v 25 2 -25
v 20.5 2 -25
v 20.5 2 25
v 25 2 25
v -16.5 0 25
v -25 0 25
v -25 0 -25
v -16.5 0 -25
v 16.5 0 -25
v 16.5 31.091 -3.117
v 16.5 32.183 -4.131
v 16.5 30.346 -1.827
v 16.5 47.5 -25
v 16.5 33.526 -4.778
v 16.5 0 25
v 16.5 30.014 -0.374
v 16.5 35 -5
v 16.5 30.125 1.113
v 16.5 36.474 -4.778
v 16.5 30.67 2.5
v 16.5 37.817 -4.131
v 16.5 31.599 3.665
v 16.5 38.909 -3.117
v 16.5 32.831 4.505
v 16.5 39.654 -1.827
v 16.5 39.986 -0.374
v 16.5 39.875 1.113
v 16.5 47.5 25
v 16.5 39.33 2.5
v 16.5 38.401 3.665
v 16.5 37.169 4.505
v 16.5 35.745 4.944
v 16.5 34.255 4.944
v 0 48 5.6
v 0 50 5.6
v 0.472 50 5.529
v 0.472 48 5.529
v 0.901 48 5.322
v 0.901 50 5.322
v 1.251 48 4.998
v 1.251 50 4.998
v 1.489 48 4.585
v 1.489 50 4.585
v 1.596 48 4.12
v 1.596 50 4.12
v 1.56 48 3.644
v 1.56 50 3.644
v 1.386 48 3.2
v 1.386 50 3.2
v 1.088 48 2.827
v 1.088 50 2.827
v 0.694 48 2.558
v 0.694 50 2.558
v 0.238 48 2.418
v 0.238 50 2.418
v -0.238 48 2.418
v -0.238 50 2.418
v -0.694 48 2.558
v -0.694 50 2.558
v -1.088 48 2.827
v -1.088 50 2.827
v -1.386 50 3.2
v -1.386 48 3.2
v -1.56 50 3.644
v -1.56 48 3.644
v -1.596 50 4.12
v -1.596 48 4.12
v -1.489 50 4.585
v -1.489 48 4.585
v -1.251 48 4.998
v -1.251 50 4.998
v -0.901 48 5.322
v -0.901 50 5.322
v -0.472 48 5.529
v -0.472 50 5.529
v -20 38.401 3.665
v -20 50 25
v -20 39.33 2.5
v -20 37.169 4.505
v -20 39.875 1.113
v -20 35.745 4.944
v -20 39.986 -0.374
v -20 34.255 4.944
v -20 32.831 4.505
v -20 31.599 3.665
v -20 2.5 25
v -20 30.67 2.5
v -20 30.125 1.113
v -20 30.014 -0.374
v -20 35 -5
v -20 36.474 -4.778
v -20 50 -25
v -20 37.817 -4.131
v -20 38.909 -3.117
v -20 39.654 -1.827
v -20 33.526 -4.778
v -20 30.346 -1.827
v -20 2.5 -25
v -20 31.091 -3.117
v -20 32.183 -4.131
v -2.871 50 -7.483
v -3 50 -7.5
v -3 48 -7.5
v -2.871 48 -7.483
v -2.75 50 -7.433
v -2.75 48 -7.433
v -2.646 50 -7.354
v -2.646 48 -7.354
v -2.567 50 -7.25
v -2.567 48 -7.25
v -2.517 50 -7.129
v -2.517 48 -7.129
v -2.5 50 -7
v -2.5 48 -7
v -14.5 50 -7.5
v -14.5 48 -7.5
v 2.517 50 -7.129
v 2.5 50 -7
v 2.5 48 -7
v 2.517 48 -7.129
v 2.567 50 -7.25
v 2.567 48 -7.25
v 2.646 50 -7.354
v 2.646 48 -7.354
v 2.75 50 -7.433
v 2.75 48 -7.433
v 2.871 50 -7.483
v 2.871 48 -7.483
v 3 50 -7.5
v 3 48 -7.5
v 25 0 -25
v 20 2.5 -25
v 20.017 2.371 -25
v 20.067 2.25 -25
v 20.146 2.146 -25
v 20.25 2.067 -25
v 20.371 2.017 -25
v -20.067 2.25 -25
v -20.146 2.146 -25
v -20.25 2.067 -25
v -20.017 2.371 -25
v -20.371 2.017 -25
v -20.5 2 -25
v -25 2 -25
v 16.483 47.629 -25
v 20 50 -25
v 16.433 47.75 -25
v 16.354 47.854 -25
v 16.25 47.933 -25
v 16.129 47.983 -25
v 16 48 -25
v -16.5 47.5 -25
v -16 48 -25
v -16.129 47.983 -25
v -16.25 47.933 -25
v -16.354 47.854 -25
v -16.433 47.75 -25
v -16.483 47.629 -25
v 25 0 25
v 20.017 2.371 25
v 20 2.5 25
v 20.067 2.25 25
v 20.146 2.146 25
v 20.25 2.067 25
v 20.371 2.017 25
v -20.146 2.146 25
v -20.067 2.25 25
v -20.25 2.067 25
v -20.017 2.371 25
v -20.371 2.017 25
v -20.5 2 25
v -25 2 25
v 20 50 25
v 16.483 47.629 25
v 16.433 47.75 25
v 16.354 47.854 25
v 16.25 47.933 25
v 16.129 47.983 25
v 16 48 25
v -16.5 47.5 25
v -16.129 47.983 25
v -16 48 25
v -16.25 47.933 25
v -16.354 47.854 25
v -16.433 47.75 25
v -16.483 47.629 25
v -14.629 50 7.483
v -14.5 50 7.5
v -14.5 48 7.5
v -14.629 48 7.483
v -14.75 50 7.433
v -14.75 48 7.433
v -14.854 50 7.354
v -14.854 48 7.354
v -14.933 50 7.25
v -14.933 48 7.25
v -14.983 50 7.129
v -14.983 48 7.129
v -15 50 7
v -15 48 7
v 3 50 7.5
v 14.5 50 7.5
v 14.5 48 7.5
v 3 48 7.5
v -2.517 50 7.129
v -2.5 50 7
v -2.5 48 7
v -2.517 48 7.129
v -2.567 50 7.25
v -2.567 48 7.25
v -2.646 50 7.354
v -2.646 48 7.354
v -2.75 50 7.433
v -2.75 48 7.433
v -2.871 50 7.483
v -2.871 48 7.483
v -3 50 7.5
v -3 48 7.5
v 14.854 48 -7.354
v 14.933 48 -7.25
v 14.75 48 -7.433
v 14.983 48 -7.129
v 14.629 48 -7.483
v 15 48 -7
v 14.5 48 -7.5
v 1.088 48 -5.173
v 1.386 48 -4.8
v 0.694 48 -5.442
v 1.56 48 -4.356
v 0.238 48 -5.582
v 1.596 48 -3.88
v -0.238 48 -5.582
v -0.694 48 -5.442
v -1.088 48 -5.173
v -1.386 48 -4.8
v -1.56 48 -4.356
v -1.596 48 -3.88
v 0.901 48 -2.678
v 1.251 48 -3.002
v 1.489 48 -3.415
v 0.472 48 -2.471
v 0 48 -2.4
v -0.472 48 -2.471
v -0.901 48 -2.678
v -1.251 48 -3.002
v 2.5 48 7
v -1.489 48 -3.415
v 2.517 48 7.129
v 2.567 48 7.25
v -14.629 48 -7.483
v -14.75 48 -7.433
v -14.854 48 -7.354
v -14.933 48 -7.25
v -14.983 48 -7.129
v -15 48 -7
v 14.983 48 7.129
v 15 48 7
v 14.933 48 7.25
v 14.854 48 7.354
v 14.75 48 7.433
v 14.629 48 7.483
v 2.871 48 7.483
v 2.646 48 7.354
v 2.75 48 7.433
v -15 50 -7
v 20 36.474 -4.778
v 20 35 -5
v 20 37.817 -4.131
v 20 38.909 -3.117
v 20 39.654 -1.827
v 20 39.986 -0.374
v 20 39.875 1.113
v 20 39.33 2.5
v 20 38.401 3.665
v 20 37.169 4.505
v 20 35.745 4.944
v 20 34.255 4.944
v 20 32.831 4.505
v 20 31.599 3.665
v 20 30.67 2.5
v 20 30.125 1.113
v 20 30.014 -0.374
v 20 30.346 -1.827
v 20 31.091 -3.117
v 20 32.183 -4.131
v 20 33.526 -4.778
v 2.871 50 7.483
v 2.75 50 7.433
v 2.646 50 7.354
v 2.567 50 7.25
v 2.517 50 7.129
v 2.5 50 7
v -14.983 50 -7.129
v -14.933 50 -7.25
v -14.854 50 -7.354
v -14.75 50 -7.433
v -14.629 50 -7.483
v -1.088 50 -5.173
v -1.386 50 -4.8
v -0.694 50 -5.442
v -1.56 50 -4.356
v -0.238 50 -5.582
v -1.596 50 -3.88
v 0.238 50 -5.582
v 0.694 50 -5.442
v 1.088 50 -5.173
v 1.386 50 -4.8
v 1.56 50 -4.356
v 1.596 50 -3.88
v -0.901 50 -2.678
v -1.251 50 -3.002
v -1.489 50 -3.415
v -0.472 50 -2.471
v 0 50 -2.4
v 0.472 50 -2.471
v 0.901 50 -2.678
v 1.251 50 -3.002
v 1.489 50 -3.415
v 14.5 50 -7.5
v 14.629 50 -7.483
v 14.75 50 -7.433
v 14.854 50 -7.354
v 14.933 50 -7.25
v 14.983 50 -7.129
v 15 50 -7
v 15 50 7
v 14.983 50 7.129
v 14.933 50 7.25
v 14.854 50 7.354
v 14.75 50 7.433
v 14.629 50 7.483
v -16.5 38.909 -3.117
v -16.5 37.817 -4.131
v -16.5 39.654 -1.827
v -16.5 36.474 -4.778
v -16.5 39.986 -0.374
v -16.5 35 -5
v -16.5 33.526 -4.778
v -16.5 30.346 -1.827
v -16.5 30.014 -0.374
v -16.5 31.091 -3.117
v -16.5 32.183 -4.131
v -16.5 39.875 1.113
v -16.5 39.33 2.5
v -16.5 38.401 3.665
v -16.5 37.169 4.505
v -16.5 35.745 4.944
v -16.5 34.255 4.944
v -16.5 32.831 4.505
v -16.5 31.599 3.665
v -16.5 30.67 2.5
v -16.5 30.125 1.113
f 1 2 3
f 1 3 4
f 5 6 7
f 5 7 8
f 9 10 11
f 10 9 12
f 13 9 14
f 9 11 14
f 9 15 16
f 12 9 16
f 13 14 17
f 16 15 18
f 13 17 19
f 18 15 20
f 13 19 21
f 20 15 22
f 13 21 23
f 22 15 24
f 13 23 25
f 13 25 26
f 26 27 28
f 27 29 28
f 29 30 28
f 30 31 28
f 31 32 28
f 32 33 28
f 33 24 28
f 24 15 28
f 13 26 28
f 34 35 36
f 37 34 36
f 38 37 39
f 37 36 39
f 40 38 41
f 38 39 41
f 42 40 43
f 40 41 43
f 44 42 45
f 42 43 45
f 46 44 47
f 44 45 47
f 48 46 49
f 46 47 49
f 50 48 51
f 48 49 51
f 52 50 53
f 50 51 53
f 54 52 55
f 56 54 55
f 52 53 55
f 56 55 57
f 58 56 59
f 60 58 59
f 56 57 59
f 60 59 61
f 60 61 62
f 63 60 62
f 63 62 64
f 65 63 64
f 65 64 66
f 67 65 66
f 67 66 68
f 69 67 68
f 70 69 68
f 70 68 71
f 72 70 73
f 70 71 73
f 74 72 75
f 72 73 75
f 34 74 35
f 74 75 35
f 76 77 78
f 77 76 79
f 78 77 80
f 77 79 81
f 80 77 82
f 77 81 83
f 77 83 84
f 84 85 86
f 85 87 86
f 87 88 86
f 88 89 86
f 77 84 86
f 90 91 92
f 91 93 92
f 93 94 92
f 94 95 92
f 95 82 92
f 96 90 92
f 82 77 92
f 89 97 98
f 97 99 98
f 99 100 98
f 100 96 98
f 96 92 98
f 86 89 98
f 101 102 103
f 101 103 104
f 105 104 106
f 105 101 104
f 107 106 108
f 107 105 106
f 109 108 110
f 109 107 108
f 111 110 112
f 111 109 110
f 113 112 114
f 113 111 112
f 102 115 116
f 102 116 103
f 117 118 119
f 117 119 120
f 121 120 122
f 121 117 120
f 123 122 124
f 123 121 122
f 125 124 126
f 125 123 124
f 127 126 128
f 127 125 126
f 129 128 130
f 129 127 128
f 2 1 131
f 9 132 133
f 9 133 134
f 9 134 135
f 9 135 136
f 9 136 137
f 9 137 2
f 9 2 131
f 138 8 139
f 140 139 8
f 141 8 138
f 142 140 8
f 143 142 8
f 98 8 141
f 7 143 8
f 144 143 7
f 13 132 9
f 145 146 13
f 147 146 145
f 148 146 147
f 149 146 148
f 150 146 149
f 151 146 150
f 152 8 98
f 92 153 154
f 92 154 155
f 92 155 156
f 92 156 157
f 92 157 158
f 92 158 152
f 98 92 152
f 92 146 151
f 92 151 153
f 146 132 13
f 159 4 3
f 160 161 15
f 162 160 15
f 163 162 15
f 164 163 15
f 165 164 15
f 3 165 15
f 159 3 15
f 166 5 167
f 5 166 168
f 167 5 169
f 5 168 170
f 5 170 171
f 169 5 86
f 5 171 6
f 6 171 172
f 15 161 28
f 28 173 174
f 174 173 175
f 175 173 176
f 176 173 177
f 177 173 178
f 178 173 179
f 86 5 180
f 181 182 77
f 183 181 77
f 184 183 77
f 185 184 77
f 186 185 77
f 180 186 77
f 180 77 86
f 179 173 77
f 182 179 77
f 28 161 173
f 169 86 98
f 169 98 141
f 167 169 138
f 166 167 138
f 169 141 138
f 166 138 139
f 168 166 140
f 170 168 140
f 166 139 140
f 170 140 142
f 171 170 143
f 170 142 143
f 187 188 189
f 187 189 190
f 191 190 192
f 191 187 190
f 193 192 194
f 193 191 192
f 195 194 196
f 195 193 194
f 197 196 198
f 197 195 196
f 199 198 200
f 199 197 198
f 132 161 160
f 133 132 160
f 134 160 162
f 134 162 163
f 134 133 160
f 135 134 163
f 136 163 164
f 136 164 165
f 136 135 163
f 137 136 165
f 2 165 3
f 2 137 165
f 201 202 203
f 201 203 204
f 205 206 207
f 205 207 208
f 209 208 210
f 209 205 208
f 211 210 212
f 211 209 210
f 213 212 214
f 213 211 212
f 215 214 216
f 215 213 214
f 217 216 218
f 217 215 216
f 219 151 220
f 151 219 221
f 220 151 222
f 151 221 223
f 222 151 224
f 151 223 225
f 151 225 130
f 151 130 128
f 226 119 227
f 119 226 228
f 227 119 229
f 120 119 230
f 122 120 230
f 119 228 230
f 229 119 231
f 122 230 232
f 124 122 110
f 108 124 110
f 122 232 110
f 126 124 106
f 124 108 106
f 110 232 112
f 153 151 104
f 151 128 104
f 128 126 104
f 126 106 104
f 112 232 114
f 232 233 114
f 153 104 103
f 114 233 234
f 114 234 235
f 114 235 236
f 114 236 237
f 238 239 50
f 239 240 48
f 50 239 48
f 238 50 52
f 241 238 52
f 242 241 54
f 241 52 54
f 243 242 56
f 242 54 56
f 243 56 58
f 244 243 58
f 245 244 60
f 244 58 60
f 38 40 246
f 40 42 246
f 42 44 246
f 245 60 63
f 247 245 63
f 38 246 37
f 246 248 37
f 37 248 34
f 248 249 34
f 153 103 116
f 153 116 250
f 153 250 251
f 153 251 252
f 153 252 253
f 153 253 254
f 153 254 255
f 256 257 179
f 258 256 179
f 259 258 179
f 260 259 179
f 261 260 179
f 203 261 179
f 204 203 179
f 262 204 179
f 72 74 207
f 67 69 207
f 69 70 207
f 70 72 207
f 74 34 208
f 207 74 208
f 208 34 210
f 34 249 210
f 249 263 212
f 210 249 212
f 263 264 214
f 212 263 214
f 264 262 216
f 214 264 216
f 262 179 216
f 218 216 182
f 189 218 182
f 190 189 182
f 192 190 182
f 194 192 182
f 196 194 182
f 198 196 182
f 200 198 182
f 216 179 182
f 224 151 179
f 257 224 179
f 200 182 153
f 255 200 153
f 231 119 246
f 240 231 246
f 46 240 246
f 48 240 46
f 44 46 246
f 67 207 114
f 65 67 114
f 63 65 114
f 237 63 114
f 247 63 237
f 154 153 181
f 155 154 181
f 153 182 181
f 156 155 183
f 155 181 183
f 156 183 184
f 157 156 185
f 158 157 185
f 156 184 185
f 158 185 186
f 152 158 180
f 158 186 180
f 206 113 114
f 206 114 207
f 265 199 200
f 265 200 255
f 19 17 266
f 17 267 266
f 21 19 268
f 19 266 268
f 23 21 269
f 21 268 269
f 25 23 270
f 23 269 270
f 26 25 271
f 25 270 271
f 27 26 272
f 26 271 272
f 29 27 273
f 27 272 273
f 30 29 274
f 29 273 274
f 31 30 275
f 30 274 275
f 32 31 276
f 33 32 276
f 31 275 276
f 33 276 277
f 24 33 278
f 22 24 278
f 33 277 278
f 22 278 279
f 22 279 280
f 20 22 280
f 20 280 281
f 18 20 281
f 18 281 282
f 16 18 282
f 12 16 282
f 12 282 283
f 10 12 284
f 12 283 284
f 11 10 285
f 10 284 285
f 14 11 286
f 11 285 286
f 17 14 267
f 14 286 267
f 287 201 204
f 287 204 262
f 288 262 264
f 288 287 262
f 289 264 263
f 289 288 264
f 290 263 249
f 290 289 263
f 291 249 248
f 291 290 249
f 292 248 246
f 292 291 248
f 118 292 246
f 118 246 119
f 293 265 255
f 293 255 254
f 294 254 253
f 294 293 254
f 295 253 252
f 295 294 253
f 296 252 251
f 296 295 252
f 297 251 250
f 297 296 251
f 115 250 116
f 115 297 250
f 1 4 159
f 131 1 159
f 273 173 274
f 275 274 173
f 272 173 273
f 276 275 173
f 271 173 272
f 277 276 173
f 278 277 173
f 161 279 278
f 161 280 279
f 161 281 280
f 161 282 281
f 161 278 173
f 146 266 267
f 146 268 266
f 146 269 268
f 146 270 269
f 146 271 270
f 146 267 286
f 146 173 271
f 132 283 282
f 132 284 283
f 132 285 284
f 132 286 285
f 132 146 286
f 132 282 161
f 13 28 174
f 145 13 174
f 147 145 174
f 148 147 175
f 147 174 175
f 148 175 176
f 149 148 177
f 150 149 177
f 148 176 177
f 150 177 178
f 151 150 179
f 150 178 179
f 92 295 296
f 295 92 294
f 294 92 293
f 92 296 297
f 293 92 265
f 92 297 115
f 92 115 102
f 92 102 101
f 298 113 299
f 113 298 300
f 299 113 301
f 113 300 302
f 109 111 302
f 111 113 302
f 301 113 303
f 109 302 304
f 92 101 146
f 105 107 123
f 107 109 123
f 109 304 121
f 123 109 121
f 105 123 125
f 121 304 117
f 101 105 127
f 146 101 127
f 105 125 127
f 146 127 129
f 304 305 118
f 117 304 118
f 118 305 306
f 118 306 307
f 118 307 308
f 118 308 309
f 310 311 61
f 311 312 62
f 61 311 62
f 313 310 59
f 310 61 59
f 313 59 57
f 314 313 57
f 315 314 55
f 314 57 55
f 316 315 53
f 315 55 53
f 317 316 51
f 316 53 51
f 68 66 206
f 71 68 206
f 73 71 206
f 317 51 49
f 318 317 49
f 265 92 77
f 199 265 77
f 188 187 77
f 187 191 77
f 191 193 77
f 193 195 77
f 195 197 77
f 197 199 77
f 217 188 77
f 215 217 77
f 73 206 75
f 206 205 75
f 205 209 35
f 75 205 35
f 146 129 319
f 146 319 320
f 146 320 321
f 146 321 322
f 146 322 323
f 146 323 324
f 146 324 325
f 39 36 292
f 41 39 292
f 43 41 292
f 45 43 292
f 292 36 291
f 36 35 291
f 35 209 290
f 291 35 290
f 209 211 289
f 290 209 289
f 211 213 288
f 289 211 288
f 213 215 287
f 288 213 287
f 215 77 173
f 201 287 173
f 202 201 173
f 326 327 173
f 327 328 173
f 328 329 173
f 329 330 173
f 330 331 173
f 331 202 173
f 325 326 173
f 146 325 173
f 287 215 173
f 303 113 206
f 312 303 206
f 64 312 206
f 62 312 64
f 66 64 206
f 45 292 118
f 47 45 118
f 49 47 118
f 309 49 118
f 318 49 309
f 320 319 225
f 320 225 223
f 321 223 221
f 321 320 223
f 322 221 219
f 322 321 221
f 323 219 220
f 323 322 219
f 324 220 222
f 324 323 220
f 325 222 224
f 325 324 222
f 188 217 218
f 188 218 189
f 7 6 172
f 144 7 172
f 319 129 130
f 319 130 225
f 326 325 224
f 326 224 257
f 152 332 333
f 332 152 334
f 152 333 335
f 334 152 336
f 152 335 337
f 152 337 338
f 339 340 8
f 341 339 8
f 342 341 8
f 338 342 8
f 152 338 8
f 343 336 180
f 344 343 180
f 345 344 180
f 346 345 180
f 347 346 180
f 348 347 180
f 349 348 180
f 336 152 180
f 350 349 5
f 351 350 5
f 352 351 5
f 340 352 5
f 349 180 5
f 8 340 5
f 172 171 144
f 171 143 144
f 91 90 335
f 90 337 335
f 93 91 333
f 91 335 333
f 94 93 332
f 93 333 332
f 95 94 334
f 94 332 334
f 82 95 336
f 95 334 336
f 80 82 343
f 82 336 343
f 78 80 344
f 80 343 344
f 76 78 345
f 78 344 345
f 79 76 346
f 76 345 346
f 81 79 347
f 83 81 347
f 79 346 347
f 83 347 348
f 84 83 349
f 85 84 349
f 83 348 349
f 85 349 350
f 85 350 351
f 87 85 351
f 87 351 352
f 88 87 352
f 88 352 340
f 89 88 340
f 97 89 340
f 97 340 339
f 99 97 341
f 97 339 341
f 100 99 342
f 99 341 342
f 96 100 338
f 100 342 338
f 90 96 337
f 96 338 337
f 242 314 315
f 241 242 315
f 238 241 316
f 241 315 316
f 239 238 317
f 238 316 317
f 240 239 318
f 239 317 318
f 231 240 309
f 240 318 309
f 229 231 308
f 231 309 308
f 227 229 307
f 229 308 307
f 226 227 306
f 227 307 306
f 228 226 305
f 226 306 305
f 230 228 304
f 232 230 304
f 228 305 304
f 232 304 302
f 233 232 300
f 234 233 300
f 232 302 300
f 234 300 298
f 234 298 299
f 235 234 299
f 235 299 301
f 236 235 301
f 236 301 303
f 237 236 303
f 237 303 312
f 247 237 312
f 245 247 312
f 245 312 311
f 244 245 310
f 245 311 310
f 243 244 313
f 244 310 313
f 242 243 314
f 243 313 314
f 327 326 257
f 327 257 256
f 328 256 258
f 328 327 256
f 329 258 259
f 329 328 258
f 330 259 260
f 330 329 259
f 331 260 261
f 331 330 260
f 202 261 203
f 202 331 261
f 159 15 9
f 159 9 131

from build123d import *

# Parameters (mm, degrees)
EXTRUDE_1_DEPTH     = 25
CUT_EXTRUDE_1_DEPTH = 25
SKETCH_3_R          = 1.6
CUT_EXTRUDE_2_DEPTH = 2
SKETCH_4_R          = 5
CUT_EXTRUDE_3_DEPTH = 25


with BuildPart() as part:
    # 草图1 → 凸台-拉伸1 (new, symmetric)
    with BuildSketch(Plane.XY):
        Polygon((0, 0), (-25, 0), (-25, 50), (25, 50), (25, 0), align=None)
    extrude(amount=EXTRUDE_1_DEPTH, both=True)

    # 草图2 → 切除-拉伸1 (cut, symmetric)
    with BuildSketch(Plane.XY):
        with BuildLine():
            Line((-25, 50), (-20, 50))
            Line((-20, 50), (-20, 2.5))
            ThreePointArc((-20, 2.5), (-20.146446609, 2.146446609), (-20.5, 2))
            Line((-20.5, 2), (-25, 2))
            Line((-25, 2), (-25, 50))
        make_face()
        with BuildLine():
            Line((25, 50), (20, 50))
            Line((20, 50), (20, 2.5))
            ThreePointArc((20, 2.5), (20.146446609, 2.146446609), (20.5, 2))
            Line((20.5, 2), (25, 2))
            Line((25, 2), (25, 50))
        make_face()
        with BuildLine():
            Line((-16.5, 0), (16.5, 0))
            Line((16.5, 0), (16.5, 47.5))
            ThreePointArc((16.5, 47.5), (16.353553391, 47.853553391), (16, 48))
            Line((16, 48), (-16, 48))
            ThreePointArc((-16, 48), (-16.353553391, 47.853553391), (-16.5, 47.5))
            Line((-16.5, 47.5), (-16.5, 0))
        make_face()
    extrude(amount=CUT_EXTRUDE_1_DEPTH, both=True, mode=Mode.SUBTRACT)

    # 草图3 → 切除-拉伸2 (cut)
    with BuildSketch(Plane(origin=(0, 50, 0), x_dir=(1, 0, 0), z_dir=(0, 1, 0))):
        with Locations(Location((0, 4, 0), (0, 0, 270))):
            Circle(SKETCH_3_R)
        with Locations(Location((0, -4, 0), (0, 0, 270))):
            Circle(SKETCH_3_R)
        with BuildLine():
            Line((3, 7.5), (14.5, 7.5))
            ThreePointArc((14.5, 7.5), (14.853553391, 7.353553391), (15, 7))
            Line((15, 7), (15, -7))
            ThreePointArc((15, -7), (14.853553391, -7.353553391), (14.5, -7.5))
            Line((14.5, -7.5), (3, -7.5))
            ThreePointArc((3, -7.5), (2.646446609, -7.353553391), (2.5, -7))
            Line((2.5, -7), (2.5, 7))
            ThreePointArc((2.5, 7), (2.646446609, 7.353553391), (3, 7.5))
        make_face()
        with BuildLine():
            Line((-14.5, 7.5), (-3, 7.5))
            ThreePointArc((-3, 7.5), (-2.646446609, 7.353553391), (-2.5, 7))
            Line((-2.5, 7), (-2.5, 0))
            Line((-2.5, 0), (-2.5, -7))
            ThreePointArc((-2.5, -7), (-2.646446609, -7.353553391), (-3, -7.5))
            Line((-3, -7.5), (-14.5, -7.5))
            ThreePointArc((-14.5, -7.5), (-14.853553391, -7.353553391), (-15, -7))
            Line((-15, -7), (-15, 7))
            ThreePointArc((-15, 7), (-14.853553391, 7.353553391), (-14.5, 7.5))
        make_face()
    extrude(amount=-CUT_EXTRUDE_2_DEPTH, mode=Mode.SUBTRACT)

    # 草图4 → 切除-拉伸3 (cut, symmetric)
    with BuildSketch(Plane(origin=(0, 0, 0), x_dir=(0, 0, -1), z_dir=(1, 0, 0))):
        with Locations((0, 35)):
            Circle(SKETCH_4_R)
    extrude(amount=CUT_EXTRUDE_3_DEPTH, both=True, mode=Mode.SUBTRACT)


solid = part.part
